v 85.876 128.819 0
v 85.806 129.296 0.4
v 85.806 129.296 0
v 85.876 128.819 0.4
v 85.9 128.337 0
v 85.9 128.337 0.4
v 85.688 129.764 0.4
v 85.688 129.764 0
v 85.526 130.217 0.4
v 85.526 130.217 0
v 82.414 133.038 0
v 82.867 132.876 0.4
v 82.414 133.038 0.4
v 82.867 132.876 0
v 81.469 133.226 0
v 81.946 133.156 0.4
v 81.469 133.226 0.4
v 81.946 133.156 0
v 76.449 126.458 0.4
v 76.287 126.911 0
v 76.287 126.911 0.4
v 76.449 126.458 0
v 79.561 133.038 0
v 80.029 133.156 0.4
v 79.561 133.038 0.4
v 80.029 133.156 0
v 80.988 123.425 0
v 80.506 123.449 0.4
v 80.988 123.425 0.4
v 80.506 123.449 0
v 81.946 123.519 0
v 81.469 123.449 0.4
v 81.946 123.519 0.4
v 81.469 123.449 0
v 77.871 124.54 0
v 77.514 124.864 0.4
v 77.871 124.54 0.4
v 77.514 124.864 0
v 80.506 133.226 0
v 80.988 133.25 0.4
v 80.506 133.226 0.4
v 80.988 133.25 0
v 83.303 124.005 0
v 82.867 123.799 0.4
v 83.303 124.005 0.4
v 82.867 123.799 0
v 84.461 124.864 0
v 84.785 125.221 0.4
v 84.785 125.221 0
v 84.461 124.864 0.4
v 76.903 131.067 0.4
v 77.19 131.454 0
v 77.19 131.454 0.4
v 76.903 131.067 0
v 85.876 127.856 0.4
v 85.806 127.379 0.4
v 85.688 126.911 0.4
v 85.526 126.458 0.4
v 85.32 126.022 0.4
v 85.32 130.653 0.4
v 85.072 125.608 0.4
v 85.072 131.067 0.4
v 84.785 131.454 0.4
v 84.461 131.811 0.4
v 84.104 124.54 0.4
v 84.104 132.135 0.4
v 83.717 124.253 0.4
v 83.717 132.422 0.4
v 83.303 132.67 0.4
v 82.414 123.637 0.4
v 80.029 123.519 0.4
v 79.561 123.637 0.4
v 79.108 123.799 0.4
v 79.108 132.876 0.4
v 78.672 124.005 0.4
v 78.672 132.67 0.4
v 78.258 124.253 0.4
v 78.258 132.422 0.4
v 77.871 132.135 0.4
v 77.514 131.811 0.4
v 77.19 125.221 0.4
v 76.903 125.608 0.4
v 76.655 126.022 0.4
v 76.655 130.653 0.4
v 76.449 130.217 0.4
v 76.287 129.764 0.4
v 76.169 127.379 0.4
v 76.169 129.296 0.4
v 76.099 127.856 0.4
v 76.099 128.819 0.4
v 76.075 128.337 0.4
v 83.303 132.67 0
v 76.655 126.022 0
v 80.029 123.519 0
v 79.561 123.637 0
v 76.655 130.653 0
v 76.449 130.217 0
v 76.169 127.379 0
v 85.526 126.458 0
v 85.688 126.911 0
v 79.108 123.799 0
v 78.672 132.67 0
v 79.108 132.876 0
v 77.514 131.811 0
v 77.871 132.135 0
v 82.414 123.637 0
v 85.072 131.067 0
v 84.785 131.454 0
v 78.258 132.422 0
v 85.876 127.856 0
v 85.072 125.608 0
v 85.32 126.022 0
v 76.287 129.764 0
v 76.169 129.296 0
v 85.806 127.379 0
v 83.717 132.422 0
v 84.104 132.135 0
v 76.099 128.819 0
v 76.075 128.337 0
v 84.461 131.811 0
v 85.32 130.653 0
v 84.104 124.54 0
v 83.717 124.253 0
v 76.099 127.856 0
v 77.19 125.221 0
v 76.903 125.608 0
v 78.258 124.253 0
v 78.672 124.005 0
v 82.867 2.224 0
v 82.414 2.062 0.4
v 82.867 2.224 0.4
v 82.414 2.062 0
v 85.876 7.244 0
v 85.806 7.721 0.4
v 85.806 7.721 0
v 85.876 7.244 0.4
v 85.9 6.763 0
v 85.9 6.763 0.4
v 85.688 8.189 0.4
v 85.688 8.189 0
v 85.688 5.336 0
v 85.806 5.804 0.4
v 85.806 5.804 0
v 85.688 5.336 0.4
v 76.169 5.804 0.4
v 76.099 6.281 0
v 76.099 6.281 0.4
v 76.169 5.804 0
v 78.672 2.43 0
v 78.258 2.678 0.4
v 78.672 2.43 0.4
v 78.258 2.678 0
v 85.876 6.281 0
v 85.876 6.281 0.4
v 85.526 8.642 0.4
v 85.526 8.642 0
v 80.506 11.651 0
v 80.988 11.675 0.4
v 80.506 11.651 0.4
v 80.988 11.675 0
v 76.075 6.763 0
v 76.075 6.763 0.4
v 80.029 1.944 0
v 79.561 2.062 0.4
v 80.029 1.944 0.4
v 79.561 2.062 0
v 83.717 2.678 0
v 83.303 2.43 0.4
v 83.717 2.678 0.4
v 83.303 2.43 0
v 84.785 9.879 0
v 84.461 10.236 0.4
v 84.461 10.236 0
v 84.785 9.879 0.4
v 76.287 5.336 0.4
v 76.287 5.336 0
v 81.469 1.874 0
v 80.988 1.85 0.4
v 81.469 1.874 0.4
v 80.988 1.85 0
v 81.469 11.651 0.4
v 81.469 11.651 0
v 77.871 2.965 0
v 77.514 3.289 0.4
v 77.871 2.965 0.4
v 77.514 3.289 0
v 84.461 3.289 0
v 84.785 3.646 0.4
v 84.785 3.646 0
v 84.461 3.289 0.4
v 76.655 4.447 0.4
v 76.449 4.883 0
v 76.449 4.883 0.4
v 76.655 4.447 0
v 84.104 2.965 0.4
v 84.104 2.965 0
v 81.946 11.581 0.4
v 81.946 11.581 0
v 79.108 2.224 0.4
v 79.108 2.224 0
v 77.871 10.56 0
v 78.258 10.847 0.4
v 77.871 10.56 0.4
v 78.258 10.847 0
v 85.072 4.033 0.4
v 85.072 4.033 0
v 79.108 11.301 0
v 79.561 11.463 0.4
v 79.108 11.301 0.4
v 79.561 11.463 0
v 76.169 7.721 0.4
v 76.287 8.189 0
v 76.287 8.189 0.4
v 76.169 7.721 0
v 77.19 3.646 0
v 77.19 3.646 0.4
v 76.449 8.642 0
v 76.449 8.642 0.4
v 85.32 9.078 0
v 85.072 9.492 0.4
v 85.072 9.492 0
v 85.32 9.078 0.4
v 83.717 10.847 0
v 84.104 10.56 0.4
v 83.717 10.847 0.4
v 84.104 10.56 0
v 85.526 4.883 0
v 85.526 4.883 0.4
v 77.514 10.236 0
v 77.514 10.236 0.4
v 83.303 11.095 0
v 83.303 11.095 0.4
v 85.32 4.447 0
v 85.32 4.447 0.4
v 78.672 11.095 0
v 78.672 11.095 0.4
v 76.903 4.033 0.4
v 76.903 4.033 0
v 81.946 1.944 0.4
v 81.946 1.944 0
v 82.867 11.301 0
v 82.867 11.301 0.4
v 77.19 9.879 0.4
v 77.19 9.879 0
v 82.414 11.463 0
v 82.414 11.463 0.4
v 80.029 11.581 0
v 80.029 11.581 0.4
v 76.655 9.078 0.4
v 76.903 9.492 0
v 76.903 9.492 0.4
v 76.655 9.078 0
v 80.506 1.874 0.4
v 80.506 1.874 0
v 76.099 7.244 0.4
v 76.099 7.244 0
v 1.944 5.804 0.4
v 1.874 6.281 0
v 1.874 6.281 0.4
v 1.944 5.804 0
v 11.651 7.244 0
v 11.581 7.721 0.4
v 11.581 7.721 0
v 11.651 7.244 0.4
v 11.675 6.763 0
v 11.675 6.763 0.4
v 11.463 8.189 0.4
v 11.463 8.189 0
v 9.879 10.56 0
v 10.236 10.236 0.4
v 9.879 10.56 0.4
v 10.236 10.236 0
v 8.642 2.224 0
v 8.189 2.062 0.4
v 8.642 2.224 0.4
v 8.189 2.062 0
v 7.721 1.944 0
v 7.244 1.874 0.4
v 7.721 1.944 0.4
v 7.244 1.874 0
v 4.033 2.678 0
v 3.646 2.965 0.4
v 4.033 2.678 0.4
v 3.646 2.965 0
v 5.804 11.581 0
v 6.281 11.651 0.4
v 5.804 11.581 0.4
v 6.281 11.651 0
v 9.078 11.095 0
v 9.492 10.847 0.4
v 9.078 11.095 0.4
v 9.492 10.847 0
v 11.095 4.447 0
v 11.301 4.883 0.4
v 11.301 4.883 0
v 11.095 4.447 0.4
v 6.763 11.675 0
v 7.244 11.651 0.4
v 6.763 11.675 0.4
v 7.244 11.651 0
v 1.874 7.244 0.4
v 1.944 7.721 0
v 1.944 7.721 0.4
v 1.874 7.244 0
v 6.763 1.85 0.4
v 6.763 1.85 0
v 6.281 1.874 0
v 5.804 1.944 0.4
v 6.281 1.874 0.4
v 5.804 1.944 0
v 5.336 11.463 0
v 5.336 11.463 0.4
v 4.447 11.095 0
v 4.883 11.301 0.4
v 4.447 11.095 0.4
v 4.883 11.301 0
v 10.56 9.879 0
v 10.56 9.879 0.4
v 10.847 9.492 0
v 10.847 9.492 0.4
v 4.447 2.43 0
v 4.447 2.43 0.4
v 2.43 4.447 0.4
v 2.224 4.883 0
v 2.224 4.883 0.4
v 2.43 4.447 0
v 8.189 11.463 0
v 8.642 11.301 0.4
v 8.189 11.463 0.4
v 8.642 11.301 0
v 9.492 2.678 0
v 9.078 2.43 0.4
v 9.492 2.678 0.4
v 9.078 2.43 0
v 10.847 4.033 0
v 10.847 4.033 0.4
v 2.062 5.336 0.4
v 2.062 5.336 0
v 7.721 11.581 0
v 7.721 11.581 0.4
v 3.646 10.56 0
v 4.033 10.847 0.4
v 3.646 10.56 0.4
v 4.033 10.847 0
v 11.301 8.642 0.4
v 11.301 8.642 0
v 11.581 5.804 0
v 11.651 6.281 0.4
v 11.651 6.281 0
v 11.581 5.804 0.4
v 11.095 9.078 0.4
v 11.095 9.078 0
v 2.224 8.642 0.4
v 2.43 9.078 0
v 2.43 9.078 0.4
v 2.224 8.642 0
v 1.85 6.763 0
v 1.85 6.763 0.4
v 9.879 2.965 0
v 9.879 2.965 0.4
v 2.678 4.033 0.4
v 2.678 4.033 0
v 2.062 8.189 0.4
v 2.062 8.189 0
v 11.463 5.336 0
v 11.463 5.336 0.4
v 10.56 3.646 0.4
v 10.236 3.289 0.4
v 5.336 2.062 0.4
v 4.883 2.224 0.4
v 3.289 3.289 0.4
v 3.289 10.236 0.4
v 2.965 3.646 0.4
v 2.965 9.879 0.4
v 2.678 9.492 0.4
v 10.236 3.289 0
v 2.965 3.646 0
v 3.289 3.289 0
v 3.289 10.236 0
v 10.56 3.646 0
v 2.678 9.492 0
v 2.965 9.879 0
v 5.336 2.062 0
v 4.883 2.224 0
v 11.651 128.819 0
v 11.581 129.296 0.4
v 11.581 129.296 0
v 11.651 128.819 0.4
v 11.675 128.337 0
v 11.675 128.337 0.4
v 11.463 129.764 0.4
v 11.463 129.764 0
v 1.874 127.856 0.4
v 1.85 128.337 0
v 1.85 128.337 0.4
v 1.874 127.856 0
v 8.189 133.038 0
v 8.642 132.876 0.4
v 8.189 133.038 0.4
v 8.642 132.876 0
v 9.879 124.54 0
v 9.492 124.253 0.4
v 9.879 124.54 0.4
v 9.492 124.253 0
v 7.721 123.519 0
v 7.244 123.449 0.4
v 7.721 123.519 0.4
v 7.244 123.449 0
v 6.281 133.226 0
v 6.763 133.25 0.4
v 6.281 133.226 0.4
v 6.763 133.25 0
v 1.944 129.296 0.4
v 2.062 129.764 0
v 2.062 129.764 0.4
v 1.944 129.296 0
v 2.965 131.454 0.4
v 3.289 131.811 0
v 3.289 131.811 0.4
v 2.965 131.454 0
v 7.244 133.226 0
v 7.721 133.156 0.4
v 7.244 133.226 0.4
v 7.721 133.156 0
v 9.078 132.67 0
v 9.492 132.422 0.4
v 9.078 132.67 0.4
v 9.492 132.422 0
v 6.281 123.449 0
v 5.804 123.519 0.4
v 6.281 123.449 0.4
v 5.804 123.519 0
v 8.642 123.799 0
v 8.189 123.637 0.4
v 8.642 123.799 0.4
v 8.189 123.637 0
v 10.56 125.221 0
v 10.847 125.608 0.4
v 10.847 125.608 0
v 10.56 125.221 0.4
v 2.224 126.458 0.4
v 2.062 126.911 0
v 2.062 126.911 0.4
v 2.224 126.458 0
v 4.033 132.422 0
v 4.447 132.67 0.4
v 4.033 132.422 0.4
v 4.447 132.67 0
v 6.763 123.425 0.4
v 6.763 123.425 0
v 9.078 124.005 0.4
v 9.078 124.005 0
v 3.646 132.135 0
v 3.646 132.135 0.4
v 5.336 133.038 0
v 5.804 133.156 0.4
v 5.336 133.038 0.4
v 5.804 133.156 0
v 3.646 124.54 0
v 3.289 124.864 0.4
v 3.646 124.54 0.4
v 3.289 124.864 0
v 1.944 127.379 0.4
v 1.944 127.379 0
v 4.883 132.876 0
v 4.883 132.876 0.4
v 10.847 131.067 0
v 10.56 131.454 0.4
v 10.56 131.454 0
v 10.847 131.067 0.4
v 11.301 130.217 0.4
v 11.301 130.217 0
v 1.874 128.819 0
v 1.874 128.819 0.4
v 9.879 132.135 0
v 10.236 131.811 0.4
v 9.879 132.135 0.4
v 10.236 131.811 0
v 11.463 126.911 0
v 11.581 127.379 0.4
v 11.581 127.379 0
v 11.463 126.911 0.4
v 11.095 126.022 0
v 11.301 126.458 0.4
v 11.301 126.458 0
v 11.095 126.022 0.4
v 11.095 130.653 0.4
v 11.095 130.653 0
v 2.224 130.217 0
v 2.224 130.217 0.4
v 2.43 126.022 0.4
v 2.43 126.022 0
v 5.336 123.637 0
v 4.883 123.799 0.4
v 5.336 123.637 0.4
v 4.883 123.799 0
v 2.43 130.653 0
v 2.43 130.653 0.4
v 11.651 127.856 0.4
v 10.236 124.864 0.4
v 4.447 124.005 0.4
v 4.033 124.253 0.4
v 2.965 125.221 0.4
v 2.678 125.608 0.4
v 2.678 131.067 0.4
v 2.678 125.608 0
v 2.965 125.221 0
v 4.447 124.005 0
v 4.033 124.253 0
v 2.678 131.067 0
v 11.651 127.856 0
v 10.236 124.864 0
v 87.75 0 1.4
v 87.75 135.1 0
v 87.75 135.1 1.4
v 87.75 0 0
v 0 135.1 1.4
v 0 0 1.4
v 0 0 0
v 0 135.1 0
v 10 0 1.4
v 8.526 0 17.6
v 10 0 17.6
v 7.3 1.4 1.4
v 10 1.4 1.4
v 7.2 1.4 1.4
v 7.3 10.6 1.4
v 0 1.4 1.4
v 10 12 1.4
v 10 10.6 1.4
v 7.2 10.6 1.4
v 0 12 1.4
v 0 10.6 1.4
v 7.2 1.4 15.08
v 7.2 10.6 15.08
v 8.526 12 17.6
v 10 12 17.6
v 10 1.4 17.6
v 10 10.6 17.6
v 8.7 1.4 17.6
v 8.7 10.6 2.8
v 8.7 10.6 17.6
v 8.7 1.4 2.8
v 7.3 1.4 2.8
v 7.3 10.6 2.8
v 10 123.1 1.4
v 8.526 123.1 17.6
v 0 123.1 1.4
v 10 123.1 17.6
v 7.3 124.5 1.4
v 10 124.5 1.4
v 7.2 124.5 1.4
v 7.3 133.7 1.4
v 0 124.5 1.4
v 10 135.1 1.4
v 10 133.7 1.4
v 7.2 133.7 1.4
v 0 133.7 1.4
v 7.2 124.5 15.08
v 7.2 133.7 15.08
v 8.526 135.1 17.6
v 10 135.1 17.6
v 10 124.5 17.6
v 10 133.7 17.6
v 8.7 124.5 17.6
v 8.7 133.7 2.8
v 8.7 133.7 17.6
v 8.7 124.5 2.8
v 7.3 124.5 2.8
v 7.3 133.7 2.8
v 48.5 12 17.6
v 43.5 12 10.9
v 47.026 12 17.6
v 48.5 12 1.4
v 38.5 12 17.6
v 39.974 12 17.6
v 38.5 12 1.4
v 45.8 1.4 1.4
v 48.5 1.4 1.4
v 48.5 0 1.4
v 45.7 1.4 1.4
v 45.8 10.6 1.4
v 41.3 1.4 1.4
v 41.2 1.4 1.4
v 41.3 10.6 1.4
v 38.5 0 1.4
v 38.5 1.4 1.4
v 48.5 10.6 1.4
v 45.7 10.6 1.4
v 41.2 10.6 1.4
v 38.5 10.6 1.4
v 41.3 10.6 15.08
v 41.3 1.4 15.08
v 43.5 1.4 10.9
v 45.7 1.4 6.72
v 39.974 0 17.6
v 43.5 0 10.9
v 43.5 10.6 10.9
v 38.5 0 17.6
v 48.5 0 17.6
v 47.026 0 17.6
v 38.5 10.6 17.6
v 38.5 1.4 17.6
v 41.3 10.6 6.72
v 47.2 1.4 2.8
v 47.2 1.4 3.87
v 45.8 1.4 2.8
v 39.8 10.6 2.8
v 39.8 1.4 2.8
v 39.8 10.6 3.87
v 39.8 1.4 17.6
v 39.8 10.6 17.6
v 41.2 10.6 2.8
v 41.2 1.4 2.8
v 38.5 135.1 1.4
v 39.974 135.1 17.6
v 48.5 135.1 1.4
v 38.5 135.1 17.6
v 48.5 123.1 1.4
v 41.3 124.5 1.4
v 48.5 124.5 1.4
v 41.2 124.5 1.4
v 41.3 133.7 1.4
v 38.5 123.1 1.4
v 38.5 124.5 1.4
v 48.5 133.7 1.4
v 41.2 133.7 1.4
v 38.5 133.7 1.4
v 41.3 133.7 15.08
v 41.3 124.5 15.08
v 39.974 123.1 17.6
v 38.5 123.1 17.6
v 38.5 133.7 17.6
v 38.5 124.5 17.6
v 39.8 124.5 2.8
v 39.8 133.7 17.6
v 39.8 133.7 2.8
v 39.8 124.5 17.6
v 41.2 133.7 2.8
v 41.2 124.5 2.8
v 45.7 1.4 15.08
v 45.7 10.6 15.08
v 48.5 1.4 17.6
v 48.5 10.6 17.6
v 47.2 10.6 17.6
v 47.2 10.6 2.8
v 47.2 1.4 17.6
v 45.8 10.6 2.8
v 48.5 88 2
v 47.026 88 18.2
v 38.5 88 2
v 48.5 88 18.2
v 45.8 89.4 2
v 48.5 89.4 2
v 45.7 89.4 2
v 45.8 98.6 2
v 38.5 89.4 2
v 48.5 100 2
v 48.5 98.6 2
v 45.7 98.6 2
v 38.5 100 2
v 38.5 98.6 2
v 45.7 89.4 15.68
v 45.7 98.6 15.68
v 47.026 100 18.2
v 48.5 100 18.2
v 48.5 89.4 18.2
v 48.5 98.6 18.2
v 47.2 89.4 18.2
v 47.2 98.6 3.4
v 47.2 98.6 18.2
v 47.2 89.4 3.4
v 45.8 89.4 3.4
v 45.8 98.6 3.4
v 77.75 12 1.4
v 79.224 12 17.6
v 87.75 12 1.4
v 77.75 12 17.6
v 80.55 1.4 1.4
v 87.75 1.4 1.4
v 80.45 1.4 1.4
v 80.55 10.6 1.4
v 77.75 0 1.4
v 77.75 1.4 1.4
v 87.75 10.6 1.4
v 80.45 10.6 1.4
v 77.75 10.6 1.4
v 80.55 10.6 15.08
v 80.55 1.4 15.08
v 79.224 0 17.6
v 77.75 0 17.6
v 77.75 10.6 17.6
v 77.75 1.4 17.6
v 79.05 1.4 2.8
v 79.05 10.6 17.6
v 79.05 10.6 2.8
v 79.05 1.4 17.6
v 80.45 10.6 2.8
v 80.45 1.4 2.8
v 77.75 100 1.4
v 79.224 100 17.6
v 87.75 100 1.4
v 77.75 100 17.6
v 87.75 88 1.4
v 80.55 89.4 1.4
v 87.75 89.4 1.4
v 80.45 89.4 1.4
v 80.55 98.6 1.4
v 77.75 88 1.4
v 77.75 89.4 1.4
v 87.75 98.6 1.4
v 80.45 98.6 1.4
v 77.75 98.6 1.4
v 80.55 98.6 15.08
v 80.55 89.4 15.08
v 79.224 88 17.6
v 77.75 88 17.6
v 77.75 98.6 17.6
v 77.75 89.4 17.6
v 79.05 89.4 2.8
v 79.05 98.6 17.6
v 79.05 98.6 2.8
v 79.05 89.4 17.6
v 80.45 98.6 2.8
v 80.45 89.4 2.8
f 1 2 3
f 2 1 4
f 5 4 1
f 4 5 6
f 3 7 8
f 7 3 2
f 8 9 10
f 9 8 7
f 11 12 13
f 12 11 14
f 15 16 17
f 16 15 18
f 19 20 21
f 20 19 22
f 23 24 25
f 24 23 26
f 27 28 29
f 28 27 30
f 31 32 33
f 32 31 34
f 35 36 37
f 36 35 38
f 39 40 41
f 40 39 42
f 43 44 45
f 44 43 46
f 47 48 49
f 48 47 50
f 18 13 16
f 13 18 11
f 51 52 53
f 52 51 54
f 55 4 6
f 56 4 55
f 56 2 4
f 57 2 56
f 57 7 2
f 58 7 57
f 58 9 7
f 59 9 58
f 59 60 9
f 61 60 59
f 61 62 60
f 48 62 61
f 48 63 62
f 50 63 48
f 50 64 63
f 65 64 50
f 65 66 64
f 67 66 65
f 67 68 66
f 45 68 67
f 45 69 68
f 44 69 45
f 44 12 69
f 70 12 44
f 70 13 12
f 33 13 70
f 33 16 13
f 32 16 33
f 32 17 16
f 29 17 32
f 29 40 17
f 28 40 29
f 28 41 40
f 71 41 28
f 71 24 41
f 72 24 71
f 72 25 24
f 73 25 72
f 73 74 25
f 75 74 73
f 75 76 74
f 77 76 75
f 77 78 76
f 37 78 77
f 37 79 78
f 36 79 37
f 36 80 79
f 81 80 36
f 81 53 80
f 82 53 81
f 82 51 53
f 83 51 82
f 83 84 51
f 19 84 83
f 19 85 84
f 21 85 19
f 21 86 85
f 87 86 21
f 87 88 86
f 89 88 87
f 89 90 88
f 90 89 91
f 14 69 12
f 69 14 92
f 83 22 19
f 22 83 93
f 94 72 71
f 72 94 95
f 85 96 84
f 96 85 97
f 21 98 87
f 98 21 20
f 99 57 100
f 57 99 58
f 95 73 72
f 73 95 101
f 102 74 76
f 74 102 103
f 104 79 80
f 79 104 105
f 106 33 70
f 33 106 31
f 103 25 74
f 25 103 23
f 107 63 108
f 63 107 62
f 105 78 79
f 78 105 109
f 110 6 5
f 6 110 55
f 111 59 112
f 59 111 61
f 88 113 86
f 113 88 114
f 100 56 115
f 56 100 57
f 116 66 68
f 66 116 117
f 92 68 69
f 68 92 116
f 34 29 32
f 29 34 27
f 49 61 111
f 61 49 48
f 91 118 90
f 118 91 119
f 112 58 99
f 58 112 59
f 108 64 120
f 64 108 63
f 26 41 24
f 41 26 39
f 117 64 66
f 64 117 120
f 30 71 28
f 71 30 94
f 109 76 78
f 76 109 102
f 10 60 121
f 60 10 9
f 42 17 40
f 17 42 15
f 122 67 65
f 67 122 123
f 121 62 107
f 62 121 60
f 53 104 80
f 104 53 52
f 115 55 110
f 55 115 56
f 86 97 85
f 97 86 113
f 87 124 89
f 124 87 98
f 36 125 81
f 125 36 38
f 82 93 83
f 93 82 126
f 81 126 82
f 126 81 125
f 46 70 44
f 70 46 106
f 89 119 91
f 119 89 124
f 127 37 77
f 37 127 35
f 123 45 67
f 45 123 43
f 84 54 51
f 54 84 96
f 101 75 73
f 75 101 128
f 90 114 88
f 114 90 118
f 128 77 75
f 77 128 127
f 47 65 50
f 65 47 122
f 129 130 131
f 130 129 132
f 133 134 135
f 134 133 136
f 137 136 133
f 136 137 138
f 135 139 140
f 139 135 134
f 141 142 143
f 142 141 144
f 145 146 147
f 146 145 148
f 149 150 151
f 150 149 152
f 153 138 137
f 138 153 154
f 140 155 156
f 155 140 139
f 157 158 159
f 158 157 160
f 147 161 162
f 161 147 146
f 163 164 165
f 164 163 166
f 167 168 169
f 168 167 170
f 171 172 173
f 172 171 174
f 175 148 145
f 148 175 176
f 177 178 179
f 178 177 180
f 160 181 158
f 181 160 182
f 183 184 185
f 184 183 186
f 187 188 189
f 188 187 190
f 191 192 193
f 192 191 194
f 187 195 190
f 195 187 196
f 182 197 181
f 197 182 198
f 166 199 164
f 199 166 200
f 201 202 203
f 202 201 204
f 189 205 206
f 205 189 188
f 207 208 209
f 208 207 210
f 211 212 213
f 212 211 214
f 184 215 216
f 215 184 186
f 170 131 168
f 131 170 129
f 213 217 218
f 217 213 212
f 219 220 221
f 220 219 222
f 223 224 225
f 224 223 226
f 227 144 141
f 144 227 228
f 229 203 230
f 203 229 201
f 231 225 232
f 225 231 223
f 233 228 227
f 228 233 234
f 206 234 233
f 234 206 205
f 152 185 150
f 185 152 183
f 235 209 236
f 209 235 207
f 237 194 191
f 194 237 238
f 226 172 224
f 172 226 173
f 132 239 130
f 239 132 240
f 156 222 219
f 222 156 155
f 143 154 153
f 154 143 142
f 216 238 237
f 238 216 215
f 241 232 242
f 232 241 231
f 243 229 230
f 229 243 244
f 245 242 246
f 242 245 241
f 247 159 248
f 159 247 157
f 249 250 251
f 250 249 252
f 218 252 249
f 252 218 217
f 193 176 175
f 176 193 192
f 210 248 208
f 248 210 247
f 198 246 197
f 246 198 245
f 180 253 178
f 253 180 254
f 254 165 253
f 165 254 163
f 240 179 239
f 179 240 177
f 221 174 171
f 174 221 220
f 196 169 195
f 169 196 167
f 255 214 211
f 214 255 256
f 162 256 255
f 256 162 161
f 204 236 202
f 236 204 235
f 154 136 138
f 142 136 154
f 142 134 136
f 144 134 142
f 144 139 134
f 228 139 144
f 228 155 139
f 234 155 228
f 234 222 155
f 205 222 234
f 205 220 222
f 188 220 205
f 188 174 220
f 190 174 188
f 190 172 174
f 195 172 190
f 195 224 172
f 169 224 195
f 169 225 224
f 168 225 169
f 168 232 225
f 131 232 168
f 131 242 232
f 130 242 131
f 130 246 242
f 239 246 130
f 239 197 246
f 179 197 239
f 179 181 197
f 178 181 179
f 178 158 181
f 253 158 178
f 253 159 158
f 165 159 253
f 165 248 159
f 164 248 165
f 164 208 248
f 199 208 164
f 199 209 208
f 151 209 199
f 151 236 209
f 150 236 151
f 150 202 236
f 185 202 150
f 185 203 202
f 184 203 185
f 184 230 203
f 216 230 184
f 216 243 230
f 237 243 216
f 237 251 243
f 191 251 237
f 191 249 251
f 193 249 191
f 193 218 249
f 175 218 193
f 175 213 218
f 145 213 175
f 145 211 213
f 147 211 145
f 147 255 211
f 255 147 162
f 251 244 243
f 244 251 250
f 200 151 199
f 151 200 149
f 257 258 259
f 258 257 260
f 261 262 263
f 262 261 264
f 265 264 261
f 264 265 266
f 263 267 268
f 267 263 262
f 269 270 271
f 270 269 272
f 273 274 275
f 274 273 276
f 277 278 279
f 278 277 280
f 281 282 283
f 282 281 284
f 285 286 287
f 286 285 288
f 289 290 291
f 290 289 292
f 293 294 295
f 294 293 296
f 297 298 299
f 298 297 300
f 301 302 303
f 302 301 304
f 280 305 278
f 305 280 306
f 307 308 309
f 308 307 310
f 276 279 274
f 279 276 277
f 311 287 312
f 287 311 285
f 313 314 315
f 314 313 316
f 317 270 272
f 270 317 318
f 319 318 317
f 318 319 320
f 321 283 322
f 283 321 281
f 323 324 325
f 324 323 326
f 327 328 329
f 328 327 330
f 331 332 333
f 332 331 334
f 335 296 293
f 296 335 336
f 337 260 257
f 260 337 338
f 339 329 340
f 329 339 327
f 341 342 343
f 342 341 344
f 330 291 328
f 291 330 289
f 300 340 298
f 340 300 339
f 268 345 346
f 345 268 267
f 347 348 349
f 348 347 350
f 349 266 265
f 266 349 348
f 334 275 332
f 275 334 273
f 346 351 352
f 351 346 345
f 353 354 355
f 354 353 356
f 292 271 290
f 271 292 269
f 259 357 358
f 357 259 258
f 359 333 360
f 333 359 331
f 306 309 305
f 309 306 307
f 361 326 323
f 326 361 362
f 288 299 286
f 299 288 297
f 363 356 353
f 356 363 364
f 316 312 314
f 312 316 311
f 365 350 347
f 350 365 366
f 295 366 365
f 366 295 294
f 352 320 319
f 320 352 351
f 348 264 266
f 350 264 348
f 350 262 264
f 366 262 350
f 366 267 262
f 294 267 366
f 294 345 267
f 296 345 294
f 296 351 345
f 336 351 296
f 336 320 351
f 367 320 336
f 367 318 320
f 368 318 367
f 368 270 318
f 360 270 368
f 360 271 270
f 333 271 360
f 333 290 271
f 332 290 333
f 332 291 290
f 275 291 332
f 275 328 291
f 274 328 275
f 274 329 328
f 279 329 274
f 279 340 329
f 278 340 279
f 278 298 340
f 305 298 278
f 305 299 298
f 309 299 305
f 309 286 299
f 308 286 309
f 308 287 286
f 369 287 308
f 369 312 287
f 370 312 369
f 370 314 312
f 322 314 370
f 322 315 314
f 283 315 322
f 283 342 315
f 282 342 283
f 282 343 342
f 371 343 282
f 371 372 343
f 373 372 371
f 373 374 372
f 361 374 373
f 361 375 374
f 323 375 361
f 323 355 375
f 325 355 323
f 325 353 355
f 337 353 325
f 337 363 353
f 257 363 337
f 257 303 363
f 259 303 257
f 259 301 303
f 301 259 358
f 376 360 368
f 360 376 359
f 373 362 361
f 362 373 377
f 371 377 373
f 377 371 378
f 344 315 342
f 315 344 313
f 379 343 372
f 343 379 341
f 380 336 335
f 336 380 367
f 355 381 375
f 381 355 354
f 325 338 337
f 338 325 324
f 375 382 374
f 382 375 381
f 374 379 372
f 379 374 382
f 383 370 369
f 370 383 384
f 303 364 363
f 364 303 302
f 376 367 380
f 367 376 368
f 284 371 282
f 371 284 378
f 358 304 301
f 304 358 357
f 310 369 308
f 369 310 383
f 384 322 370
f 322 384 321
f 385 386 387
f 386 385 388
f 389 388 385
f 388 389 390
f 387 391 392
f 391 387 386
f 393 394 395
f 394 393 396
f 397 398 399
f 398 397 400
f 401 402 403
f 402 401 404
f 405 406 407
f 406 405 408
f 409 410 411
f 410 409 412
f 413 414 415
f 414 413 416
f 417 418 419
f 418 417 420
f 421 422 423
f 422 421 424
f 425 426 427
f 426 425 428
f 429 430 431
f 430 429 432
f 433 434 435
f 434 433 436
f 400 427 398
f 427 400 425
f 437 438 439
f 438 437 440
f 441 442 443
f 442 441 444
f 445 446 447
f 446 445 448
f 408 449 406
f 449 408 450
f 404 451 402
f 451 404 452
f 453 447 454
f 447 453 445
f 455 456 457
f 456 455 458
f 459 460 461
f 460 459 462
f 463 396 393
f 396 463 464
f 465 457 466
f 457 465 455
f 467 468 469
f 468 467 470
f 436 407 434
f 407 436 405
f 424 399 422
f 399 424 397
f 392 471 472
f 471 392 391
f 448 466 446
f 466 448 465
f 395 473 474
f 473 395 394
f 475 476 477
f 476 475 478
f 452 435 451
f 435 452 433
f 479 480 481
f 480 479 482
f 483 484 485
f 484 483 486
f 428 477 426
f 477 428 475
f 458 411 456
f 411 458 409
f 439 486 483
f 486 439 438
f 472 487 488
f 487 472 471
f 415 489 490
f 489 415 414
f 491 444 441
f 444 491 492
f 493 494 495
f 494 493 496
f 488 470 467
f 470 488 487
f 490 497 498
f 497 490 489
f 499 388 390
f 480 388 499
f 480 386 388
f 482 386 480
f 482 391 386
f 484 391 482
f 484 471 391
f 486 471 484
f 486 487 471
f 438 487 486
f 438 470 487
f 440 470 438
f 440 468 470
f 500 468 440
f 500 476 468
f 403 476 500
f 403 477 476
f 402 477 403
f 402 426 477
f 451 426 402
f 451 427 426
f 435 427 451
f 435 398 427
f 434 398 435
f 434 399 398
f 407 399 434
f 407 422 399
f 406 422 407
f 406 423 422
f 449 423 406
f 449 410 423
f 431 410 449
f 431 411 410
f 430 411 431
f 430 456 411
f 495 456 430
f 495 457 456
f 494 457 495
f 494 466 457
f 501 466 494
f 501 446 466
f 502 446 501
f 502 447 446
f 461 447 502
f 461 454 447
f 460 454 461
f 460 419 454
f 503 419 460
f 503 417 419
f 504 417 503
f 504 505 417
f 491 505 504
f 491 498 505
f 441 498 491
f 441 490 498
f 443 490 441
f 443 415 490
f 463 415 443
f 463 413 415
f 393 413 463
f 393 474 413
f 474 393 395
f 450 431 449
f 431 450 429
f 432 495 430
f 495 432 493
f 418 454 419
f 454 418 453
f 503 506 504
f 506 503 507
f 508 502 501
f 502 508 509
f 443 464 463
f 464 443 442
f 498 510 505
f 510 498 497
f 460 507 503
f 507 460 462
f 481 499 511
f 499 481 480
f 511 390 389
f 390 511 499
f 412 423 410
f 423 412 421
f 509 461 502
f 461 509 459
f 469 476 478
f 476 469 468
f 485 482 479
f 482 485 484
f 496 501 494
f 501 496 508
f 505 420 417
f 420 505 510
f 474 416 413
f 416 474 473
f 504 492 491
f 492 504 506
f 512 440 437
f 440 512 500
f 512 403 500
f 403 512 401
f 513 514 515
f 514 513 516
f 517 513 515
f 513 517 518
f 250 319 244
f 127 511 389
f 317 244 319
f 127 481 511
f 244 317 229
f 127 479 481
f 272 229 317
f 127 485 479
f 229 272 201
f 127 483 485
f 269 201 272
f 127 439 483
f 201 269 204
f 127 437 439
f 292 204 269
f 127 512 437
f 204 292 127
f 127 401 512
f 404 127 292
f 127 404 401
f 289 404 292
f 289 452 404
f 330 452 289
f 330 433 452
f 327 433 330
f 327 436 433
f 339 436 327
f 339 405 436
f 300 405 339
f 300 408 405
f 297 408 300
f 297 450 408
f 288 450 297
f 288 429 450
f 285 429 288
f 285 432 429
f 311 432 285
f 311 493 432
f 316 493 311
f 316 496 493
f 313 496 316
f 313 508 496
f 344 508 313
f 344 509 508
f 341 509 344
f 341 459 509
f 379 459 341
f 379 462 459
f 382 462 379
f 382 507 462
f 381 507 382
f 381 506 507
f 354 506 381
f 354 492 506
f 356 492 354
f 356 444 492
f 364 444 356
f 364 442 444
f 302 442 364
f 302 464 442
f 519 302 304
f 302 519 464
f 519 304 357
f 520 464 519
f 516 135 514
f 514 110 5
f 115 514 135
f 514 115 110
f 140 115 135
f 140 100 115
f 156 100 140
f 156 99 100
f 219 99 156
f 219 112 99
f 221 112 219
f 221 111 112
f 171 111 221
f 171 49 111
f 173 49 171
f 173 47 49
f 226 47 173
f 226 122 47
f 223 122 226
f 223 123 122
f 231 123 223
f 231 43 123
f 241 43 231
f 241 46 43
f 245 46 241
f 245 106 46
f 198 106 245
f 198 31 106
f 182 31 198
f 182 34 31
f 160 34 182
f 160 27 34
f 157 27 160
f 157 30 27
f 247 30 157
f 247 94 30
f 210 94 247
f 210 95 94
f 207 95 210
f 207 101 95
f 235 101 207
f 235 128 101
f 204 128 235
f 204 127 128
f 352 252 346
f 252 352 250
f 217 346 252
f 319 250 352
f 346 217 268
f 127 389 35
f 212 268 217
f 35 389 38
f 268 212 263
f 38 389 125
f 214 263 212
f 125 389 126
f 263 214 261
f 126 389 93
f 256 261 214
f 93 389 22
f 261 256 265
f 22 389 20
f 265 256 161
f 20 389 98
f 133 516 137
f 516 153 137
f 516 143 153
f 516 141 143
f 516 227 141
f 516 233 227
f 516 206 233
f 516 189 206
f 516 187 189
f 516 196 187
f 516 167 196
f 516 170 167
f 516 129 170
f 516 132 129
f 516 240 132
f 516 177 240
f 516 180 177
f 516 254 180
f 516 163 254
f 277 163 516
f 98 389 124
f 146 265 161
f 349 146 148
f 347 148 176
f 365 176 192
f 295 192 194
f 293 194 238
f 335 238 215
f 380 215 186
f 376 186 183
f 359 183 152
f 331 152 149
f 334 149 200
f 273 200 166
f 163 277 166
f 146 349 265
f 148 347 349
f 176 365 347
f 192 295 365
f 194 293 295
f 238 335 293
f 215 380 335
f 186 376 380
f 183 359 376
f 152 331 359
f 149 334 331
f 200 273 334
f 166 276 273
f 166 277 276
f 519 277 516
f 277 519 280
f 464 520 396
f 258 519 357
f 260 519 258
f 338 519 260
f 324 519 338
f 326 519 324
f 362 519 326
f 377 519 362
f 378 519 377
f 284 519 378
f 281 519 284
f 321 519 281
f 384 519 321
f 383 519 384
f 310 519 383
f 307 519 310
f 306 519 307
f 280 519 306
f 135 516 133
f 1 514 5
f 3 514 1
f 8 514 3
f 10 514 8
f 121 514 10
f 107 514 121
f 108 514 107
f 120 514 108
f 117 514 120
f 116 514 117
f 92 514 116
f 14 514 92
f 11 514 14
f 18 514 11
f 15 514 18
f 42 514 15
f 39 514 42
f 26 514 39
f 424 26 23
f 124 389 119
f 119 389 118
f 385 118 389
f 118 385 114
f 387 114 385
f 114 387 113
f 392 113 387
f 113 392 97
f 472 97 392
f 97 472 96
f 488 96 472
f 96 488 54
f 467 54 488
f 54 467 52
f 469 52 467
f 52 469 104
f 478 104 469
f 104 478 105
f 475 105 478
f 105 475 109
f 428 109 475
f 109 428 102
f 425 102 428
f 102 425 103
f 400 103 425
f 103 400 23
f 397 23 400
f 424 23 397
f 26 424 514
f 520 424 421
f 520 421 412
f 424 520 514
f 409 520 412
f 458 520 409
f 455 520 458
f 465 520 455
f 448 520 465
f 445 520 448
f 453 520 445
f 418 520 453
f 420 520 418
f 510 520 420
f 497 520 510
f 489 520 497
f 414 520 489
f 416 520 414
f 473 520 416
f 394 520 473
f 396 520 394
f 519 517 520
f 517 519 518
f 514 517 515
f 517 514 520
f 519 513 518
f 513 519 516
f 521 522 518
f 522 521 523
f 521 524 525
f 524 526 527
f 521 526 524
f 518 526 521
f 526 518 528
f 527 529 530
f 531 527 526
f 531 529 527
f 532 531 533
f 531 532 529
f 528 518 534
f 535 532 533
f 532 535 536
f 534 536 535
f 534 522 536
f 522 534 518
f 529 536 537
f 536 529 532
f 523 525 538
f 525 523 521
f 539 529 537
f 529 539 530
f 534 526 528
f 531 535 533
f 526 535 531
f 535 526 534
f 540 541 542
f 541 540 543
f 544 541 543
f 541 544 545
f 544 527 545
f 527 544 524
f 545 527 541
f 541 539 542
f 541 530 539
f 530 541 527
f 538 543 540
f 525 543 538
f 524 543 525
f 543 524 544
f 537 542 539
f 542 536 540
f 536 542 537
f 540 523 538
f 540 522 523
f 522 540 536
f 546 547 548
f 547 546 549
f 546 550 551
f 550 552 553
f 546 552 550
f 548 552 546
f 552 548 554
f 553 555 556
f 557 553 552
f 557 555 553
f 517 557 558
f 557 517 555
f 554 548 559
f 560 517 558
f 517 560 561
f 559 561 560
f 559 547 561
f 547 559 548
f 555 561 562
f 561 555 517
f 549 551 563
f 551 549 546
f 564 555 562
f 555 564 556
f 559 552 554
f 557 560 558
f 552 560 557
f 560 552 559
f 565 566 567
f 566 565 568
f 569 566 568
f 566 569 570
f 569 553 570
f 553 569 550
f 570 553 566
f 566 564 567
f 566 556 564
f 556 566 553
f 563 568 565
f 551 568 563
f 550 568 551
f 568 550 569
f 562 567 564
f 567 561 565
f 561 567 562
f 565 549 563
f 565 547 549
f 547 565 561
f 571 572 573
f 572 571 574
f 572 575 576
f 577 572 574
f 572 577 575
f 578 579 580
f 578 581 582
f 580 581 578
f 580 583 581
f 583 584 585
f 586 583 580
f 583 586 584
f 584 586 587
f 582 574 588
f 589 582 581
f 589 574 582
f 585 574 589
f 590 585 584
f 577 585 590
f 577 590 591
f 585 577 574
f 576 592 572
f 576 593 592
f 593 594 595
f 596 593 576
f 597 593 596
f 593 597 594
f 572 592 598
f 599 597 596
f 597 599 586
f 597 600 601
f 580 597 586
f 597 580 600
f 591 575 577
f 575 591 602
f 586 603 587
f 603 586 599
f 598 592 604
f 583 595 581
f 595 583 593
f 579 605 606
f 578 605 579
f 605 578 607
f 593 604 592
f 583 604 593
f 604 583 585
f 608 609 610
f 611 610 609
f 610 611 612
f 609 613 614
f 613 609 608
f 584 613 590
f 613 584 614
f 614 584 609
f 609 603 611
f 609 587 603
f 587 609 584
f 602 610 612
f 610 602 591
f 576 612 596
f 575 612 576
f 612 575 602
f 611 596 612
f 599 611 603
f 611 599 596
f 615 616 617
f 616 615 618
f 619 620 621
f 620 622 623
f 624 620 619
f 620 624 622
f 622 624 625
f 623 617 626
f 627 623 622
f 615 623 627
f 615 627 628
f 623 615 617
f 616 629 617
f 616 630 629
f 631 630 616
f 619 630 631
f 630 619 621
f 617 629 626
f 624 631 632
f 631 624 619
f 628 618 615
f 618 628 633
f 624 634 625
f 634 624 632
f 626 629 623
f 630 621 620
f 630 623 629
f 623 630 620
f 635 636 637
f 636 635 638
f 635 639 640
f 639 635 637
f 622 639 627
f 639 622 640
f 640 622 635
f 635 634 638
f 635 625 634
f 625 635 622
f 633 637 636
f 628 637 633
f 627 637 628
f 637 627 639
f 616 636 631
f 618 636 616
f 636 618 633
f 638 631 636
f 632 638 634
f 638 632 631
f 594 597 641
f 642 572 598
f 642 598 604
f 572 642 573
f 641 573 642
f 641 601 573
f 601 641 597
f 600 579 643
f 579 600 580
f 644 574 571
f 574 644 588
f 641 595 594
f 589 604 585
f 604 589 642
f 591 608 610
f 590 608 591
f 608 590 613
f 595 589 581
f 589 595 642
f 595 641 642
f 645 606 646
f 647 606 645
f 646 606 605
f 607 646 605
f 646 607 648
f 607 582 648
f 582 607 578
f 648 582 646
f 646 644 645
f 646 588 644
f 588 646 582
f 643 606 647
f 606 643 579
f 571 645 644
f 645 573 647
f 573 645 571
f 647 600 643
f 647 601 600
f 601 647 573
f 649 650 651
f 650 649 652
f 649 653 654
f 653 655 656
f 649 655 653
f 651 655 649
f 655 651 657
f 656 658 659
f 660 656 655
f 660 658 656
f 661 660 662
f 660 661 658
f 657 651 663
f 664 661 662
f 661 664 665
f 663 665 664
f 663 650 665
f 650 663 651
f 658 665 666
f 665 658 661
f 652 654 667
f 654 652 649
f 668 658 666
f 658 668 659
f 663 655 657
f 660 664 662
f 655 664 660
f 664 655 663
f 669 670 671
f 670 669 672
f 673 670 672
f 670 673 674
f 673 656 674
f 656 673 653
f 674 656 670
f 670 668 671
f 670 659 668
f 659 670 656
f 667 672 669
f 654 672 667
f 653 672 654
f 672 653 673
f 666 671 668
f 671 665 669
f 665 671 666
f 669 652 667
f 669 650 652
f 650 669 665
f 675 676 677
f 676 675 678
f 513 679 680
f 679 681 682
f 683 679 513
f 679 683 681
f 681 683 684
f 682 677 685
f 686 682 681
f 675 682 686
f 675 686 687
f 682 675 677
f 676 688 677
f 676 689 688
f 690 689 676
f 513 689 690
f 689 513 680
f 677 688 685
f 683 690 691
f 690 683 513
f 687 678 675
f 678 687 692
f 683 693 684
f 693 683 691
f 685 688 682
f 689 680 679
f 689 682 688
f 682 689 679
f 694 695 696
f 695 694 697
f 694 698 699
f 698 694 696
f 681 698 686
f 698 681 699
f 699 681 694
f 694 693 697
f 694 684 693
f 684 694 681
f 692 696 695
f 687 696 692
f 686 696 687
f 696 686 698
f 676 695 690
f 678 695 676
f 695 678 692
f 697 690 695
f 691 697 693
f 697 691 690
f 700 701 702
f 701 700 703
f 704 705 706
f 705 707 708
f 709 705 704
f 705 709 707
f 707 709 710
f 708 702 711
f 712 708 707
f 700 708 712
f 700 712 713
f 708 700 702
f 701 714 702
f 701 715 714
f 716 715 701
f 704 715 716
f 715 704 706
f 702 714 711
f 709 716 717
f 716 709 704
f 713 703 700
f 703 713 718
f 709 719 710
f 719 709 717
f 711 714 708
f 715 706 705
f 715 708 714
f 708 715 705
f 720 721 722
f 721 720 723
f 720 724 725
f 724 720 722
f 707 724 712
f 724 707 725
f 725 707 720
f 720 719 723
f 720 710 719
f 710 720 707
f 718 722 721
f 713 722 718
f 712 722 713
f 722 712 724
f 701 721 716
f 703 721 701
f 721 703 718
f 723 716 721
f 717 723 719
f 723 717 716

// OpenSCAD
// file: ../modules/roundedcube.scad
// A single integer creates a cube with the specified wall distance. Default [1, 1, 1]
// size = 5;

// An [x, y, z] vector specifies distance on each axis. Default [1, 1, 1]
// size = [2, 3, 5];

// Whether or not to place the object centered on the origin. Default false
// center = true|false;

// Specify a rounding radius. Default 0.5
// radius = 0.5

// Specify where to apply the rounded corners. Default "all"
// apply_to = "all"|"x"|"y"|"z"|"zmax"|"zmin"|"xmax"|"xmin"|"ymax"|"ymin"

// Higher definition curves
$fs = 0.01;

module roundedcube(size = [1, 1, 1], center = false, radius = 0.5, apply_to = "all") {
	// If single value, convert to [x, y, z] vector
	size = (size[0] == undef) ? [size, size, size] : size;

    echo(str("roundedcube(",size,", radius=", radius, ", apply_to=",apply_to));

	translate_min = 0;
	translate_xmax = size[0];
	translate_ymax = size[1];
	translate_zmax = size[2];

	diameter = radius * 2;

    function adj2(i,dt,df) = (i==0)?dt:df;
    function adj(i,d) = adj2(i,d,-d);
    function adjR(i) = adj(i,radius);
    
	obj_translate = (center == false) ?
		[0, 0, 0] : [
			-(size[0] / 2),
			-(size[1] / 2),
			-(size[2] / 2)
		];

	translate(v = obj_translate) {
		hull() {
			for (xi = [0:1]) {
                translate_x = [translate_min, translate_xmax][xi];
				x_at = (xi == 0) ? "min" : "max";
				for (yi = [0:1]) {
                    translate_y = [translate_min, translate_ymax][yi];
   				    y_at = (yi == 0) ? "min" : "max";
					for (zi = [0:1]) {
                        translate_z = [translate_min, translate_zmax][zi];
    	     			z_at = (zi == 0) ? "min" : "max";

						if (
							(apply_to == "all") ||
							(apply_to == "xmin" && x_at == "min") || (apply_to == "xmax" && x_at == "max") ||
							(apply_to == "ymin" && y_at == "min") || (apply_to == "ymax" && y_at == "max") ||
							(apply_to == "zmin" && z_at == "min") || (apply_to == "zmax" && z_at == "max")
						) {
                            // GGS: Separate translates to asccomodate changes allowing sizes < 3 x radius
    						translate(v = [translate_x+adjR(xi), translate_y+adjR(yi), translate_z+adjR(zi)])
							  sphere(r = radius);
						} else {
							rotate = 
								(apply_to == "xmin" || apply_to == "xmax" || apply_to == "x") ? [0, 90, 0] : (
								(apply_to == "ymin" || apply_to == "ymax" || apply_to == "y") ? [90, 90, 0] :
								[0, 0, 0]
							);
                            //Compute cylinder height to make it work with cubbe sizes up to 3xradius which did not work
                            // in original because cylinders would "eat" spheres
                            h1 =
								(apply_to == "xmin" || apply_to == "xmax" || apply_to == "x") ? size[0]-radius : (
								(apply_to == "ymin" || apply_to == "ymax" || apply_to == "y") ? size[1]-radius :
								size[2]-radius
							);
                            h2 =
								(apply_to == "xmin" || apply_to == "xmax" || apply_to == "x") ? size[0]/4 : (
								(apply_to == "ymin" || apply_to == "ymax" || apply_to == "y") ? size[1]/4 :
								size[2]/4
							);
                            h=(h1<h2 && h1>0)?h1:h2;
                            height=(h<radius)?h:radius;
                            //echo(str("h1=",h1));
                            //echo(str("h2=",h2));
                            //echo(str("h=",h));
                            //echo(str("height=",height));
                            trans =
								(apply_to == "xmin" || apply_to == "xmax" || apply_to == "x") ? [adj2(xi,0,-height),adjR(yi),adjR(zi)] : (
								(apply_to == "ymin" || apply_to == "ymax" || apply_to == "y") ? [adjR(xi),adj2(yi,0,-height),adjR(zi)] :
								[adjR(xi),adjR(yi),adj2(zi,0,-height)]
							);
                            //echo(trans);
                            translate(v = [translate_x+trans[0], translate_y+trans[1], translate_z+trans[2]])
		  					  rotate(a = rotate)
							    cylinder(h = height, r = radius, center = false);
						}
					}
				}
			}
		}
	}
}
// main file
usg_width = 28.5;
usg_width_feet = 29.25;
usg_depth_to_feet = 21.5;
usg_depth = 135.1;
usg_height = 135.1;
usg_mounthole_front = 65.5;
usg_mounthole_bottom = 16.25;
usg_mounthole_diameter = 3;
echo(USG_DEPTH=usg_depth);
echo(USG_DEPTH_HALF=usg_depth/2);

usw860w_width = 29.25;
usw860w_width_feet = 30.5;
usw860w_depth = 100;
usw860w_height = 148;

foot_diameter = 9.525;

brace_stiffness = 1.;
joint_buffer = 0.3;

support_depth = 12;
support_width = 10;
support_height = 19;
support_stiffness = 1.4;
support_carveout_depth = support_depth - (support_stiffness * 2);

support_rear_gap = brace_stiffness + joint_buffer;

base_width = usg_width + usw860w_width + (support_width * 3);
base_depth = max(usg_depth, usw860w_depth);
base_height = 1.4;

echo("BASE_WIDTH=", base_width);
echo("BASE_DEPTH=", base_depth);

base_center_x = base_width / 2;
base_center_y = base_depth / 2;

use <../modules/roundedcube.scad>;

module usg() {
    difference() {
        cube([usg_width, usg_depth, usg_height], center=false);
        union() {
            $fn = 64;
            translate([usg_width, usg_depth / 2, usg_mounthole_bottom + usg_mounthole_diameter]) {
                #translate([-50, 0, 6]) rotate([0, 90, 0]) cylinder(h=100, r=0.5);
                hull() {
                    rotate([0, 90, 0]) cylinder(h=20, r=usg_mounthole_diameter);
                    translate([0, 0, 12]) rotate([0, 90, 0]) cylinder(h=20, r=usg_mounthole_diameter);
                }
                hull() {
                  translate([0, 6, 6]) rotate([0, 90, 0]) cylinder(h=20, r=usg_mounthole_diameter);
                  translate([0, -6, 6]) rotate([0, 90, 0]) cylinder(h=20, r=usg_mounthole_diameter);
                }
            }
            //translate([usg_width, usg_mounthole_front, usg_mounthole_bottom]) rotate([0, 90, 0]) cylinder(h=20, r=usg_mounthole_diameter);
        }
    }
}

module brace_with_foot(brace_depth) {
    radius = (support_stiffness / 2);
    cube([brace_stiffness, brace_depth, support_height]);
    translate([brace_stiffness, 0, radius]) rotate([270, 0, 0]) cylinder(h=brace_depth, r=radius, $fn=64);
}
module brace_verticals(brace_depth, rear_offset) {
//    cube([brace_stiffness, brace_depth, support_height]);
    //cube([brace_stiffness, brace_depth, support_height]);
    brace_with_foot(brace_depth);
    translate([0, rear_offset, 0]) brace_with_foot(brace_depth);
}
module usg_brace() {
    brace_depth = support_carveout_depth - joint_buffer;
    difference() {
        union() {
            brace_verticals(brace_depth=brace_depth, rear_offset=usg_depth - support_depth);
            // front round
            translate([0, brace_depth, support_height]) rotate([0, 90, 0]) cylinder(h=brace_stiffness, r=brace_depth, $fn=64);
            // back round
            translate([0, usg_depth - support_depth, support_height]) rotate([0, 90, 0]) cylinder(h=brace_stiffness, r=brace_depth);
            // cross beam
            translate([0, brace_depth, support_height]) cube([brace_stiffness, usg_depth - support_depth - brace_depth, brace_depth]);
        }
        union() {
            translate([0, brace_depth, -support_height]) roundedcube([brace_stiffness, usg_depth - (support_depth + brace_depth), support_height * 2], radius=3, apply_to="x");
            translate([0, (usg_depth - brace_depth/2)/2, support_height - (2/2) + (brace_depth)/ 2]) cube([brace_stiffness, 2, 2]);
            translate([brace_stiffness/2, (usg_depth - (brace_depth/2) - 2)/2, support_height - (2/2) + (brace_depth)/ 2]) cube([brace_stiffness/2, 4, 2]);
        }
    }
//    #translate([0, brace_depth, support_height]) rotate([0, 90, 0]) cube([brace_stiffness, brace_depth, 0]);
}

module usw860w() {
    cube([usw860w_width, usw860w_depth, usw860w_height], center=false);
}

module foot() {
    radius = (foot_diameter + joint_buffer) / 2;
    cylinder(10, r=(foot_diameter+joint_buffer)/2, center=false);
}
module feet_depressions(depression_depth = 0.4) {
    offset_depth = (base_depth / 2) - (foot_diameter / 2) - 2;
    offset_width = (base_width / 2) - (foot_diameter / 2) - 2;
    z = -10 + depression_depth;

    translate([base_center_x, base_center_y, z])
    for (i = [[offset_width, offset_depth, 0],
              [offset_width, -offset_depth, 0],
              [-offset_width, -offset_depth, 0],
              [-offset_width, offset_depth, 0]]) {
        translate(i) foot($fn=64);
    }
}

module support_with_carveout(carveout_depth) {
    difference() {
        rotate([90,0,180]) linear_extrude(height=support_depth) polygon(points=[[0,0],[support_width,0],[0,support_height]], paths=[[0,1,2]]);
        translate([-support_stiffness*2, support_stiffness, 0]) rotate([90, 0, 180]) linear_extrude(height=carveout_depth) polygon(points=[[0,0],[support_width,0],[0,support_height]], paths=[[0,1,2]]);
    }
}

module support() {
    support_carveout_depth = support_depth - (support_stiffness * 2);

    translate([support_width, 0, 0]) difference() {
        support_with_carveout(carveout_depth = support_carveout_depth);

        translate([-(support_stiffness+support_rear_gap),0,0]) union() {
            // bottom gap
            translate([0, support_stiffness, 0]) cube([support_stiffness, support_carveout_depth, support_stiffness]);
            // rear gap
            translate([support_stiffness, support_stiffness, 0]) cube([support_rear_gap+joint_buffer, support_carveout_depth, support_height]);
            // flattop
            translate([-support_stiffness, 0, support_height - 2.8]) cube([support_width, support_depth, 3], center=false);
        }
    }
}

module stand() {
    difference() {
        //rounded
        cube([base_width, base_depth, base_height], center=false, radius=4, apply_to="z");
        feet_depressions();
    }

    // left
    translate([0, 0, base_height]) support();
    translate([0, base_depth - support_depth, base_height]) support();

    // middle
    translate([support_width*2 + usg_width, support_depth, base_height]) rotate([0, 0, 180]) support();
    translate([support_width*2 + usg_width, base_depth, base_height]) rotate([0, 0, 180]) support();
    translate([support_width + usg_width, 0, base_height]) support();
    translate([support_width + usg_width, usw860w_depth - support_depth, 2]) support();

    // right
    translate([base_width, support_depth, base_height]) rotate([0, 0, 180]) support();
    translate([base_width, usw860w_depth, base_height]) rotate([0, 0, 180]) support();
}

stand();
//translate([support_width + usg_width, support_stiffness + (joint_buffer/2), base_height]) usg_brace();
//translate([support_width, 0, base_height]) usg();
//#translate([support_width + usg_width + support_width, 0, base_height]) usw860w();
